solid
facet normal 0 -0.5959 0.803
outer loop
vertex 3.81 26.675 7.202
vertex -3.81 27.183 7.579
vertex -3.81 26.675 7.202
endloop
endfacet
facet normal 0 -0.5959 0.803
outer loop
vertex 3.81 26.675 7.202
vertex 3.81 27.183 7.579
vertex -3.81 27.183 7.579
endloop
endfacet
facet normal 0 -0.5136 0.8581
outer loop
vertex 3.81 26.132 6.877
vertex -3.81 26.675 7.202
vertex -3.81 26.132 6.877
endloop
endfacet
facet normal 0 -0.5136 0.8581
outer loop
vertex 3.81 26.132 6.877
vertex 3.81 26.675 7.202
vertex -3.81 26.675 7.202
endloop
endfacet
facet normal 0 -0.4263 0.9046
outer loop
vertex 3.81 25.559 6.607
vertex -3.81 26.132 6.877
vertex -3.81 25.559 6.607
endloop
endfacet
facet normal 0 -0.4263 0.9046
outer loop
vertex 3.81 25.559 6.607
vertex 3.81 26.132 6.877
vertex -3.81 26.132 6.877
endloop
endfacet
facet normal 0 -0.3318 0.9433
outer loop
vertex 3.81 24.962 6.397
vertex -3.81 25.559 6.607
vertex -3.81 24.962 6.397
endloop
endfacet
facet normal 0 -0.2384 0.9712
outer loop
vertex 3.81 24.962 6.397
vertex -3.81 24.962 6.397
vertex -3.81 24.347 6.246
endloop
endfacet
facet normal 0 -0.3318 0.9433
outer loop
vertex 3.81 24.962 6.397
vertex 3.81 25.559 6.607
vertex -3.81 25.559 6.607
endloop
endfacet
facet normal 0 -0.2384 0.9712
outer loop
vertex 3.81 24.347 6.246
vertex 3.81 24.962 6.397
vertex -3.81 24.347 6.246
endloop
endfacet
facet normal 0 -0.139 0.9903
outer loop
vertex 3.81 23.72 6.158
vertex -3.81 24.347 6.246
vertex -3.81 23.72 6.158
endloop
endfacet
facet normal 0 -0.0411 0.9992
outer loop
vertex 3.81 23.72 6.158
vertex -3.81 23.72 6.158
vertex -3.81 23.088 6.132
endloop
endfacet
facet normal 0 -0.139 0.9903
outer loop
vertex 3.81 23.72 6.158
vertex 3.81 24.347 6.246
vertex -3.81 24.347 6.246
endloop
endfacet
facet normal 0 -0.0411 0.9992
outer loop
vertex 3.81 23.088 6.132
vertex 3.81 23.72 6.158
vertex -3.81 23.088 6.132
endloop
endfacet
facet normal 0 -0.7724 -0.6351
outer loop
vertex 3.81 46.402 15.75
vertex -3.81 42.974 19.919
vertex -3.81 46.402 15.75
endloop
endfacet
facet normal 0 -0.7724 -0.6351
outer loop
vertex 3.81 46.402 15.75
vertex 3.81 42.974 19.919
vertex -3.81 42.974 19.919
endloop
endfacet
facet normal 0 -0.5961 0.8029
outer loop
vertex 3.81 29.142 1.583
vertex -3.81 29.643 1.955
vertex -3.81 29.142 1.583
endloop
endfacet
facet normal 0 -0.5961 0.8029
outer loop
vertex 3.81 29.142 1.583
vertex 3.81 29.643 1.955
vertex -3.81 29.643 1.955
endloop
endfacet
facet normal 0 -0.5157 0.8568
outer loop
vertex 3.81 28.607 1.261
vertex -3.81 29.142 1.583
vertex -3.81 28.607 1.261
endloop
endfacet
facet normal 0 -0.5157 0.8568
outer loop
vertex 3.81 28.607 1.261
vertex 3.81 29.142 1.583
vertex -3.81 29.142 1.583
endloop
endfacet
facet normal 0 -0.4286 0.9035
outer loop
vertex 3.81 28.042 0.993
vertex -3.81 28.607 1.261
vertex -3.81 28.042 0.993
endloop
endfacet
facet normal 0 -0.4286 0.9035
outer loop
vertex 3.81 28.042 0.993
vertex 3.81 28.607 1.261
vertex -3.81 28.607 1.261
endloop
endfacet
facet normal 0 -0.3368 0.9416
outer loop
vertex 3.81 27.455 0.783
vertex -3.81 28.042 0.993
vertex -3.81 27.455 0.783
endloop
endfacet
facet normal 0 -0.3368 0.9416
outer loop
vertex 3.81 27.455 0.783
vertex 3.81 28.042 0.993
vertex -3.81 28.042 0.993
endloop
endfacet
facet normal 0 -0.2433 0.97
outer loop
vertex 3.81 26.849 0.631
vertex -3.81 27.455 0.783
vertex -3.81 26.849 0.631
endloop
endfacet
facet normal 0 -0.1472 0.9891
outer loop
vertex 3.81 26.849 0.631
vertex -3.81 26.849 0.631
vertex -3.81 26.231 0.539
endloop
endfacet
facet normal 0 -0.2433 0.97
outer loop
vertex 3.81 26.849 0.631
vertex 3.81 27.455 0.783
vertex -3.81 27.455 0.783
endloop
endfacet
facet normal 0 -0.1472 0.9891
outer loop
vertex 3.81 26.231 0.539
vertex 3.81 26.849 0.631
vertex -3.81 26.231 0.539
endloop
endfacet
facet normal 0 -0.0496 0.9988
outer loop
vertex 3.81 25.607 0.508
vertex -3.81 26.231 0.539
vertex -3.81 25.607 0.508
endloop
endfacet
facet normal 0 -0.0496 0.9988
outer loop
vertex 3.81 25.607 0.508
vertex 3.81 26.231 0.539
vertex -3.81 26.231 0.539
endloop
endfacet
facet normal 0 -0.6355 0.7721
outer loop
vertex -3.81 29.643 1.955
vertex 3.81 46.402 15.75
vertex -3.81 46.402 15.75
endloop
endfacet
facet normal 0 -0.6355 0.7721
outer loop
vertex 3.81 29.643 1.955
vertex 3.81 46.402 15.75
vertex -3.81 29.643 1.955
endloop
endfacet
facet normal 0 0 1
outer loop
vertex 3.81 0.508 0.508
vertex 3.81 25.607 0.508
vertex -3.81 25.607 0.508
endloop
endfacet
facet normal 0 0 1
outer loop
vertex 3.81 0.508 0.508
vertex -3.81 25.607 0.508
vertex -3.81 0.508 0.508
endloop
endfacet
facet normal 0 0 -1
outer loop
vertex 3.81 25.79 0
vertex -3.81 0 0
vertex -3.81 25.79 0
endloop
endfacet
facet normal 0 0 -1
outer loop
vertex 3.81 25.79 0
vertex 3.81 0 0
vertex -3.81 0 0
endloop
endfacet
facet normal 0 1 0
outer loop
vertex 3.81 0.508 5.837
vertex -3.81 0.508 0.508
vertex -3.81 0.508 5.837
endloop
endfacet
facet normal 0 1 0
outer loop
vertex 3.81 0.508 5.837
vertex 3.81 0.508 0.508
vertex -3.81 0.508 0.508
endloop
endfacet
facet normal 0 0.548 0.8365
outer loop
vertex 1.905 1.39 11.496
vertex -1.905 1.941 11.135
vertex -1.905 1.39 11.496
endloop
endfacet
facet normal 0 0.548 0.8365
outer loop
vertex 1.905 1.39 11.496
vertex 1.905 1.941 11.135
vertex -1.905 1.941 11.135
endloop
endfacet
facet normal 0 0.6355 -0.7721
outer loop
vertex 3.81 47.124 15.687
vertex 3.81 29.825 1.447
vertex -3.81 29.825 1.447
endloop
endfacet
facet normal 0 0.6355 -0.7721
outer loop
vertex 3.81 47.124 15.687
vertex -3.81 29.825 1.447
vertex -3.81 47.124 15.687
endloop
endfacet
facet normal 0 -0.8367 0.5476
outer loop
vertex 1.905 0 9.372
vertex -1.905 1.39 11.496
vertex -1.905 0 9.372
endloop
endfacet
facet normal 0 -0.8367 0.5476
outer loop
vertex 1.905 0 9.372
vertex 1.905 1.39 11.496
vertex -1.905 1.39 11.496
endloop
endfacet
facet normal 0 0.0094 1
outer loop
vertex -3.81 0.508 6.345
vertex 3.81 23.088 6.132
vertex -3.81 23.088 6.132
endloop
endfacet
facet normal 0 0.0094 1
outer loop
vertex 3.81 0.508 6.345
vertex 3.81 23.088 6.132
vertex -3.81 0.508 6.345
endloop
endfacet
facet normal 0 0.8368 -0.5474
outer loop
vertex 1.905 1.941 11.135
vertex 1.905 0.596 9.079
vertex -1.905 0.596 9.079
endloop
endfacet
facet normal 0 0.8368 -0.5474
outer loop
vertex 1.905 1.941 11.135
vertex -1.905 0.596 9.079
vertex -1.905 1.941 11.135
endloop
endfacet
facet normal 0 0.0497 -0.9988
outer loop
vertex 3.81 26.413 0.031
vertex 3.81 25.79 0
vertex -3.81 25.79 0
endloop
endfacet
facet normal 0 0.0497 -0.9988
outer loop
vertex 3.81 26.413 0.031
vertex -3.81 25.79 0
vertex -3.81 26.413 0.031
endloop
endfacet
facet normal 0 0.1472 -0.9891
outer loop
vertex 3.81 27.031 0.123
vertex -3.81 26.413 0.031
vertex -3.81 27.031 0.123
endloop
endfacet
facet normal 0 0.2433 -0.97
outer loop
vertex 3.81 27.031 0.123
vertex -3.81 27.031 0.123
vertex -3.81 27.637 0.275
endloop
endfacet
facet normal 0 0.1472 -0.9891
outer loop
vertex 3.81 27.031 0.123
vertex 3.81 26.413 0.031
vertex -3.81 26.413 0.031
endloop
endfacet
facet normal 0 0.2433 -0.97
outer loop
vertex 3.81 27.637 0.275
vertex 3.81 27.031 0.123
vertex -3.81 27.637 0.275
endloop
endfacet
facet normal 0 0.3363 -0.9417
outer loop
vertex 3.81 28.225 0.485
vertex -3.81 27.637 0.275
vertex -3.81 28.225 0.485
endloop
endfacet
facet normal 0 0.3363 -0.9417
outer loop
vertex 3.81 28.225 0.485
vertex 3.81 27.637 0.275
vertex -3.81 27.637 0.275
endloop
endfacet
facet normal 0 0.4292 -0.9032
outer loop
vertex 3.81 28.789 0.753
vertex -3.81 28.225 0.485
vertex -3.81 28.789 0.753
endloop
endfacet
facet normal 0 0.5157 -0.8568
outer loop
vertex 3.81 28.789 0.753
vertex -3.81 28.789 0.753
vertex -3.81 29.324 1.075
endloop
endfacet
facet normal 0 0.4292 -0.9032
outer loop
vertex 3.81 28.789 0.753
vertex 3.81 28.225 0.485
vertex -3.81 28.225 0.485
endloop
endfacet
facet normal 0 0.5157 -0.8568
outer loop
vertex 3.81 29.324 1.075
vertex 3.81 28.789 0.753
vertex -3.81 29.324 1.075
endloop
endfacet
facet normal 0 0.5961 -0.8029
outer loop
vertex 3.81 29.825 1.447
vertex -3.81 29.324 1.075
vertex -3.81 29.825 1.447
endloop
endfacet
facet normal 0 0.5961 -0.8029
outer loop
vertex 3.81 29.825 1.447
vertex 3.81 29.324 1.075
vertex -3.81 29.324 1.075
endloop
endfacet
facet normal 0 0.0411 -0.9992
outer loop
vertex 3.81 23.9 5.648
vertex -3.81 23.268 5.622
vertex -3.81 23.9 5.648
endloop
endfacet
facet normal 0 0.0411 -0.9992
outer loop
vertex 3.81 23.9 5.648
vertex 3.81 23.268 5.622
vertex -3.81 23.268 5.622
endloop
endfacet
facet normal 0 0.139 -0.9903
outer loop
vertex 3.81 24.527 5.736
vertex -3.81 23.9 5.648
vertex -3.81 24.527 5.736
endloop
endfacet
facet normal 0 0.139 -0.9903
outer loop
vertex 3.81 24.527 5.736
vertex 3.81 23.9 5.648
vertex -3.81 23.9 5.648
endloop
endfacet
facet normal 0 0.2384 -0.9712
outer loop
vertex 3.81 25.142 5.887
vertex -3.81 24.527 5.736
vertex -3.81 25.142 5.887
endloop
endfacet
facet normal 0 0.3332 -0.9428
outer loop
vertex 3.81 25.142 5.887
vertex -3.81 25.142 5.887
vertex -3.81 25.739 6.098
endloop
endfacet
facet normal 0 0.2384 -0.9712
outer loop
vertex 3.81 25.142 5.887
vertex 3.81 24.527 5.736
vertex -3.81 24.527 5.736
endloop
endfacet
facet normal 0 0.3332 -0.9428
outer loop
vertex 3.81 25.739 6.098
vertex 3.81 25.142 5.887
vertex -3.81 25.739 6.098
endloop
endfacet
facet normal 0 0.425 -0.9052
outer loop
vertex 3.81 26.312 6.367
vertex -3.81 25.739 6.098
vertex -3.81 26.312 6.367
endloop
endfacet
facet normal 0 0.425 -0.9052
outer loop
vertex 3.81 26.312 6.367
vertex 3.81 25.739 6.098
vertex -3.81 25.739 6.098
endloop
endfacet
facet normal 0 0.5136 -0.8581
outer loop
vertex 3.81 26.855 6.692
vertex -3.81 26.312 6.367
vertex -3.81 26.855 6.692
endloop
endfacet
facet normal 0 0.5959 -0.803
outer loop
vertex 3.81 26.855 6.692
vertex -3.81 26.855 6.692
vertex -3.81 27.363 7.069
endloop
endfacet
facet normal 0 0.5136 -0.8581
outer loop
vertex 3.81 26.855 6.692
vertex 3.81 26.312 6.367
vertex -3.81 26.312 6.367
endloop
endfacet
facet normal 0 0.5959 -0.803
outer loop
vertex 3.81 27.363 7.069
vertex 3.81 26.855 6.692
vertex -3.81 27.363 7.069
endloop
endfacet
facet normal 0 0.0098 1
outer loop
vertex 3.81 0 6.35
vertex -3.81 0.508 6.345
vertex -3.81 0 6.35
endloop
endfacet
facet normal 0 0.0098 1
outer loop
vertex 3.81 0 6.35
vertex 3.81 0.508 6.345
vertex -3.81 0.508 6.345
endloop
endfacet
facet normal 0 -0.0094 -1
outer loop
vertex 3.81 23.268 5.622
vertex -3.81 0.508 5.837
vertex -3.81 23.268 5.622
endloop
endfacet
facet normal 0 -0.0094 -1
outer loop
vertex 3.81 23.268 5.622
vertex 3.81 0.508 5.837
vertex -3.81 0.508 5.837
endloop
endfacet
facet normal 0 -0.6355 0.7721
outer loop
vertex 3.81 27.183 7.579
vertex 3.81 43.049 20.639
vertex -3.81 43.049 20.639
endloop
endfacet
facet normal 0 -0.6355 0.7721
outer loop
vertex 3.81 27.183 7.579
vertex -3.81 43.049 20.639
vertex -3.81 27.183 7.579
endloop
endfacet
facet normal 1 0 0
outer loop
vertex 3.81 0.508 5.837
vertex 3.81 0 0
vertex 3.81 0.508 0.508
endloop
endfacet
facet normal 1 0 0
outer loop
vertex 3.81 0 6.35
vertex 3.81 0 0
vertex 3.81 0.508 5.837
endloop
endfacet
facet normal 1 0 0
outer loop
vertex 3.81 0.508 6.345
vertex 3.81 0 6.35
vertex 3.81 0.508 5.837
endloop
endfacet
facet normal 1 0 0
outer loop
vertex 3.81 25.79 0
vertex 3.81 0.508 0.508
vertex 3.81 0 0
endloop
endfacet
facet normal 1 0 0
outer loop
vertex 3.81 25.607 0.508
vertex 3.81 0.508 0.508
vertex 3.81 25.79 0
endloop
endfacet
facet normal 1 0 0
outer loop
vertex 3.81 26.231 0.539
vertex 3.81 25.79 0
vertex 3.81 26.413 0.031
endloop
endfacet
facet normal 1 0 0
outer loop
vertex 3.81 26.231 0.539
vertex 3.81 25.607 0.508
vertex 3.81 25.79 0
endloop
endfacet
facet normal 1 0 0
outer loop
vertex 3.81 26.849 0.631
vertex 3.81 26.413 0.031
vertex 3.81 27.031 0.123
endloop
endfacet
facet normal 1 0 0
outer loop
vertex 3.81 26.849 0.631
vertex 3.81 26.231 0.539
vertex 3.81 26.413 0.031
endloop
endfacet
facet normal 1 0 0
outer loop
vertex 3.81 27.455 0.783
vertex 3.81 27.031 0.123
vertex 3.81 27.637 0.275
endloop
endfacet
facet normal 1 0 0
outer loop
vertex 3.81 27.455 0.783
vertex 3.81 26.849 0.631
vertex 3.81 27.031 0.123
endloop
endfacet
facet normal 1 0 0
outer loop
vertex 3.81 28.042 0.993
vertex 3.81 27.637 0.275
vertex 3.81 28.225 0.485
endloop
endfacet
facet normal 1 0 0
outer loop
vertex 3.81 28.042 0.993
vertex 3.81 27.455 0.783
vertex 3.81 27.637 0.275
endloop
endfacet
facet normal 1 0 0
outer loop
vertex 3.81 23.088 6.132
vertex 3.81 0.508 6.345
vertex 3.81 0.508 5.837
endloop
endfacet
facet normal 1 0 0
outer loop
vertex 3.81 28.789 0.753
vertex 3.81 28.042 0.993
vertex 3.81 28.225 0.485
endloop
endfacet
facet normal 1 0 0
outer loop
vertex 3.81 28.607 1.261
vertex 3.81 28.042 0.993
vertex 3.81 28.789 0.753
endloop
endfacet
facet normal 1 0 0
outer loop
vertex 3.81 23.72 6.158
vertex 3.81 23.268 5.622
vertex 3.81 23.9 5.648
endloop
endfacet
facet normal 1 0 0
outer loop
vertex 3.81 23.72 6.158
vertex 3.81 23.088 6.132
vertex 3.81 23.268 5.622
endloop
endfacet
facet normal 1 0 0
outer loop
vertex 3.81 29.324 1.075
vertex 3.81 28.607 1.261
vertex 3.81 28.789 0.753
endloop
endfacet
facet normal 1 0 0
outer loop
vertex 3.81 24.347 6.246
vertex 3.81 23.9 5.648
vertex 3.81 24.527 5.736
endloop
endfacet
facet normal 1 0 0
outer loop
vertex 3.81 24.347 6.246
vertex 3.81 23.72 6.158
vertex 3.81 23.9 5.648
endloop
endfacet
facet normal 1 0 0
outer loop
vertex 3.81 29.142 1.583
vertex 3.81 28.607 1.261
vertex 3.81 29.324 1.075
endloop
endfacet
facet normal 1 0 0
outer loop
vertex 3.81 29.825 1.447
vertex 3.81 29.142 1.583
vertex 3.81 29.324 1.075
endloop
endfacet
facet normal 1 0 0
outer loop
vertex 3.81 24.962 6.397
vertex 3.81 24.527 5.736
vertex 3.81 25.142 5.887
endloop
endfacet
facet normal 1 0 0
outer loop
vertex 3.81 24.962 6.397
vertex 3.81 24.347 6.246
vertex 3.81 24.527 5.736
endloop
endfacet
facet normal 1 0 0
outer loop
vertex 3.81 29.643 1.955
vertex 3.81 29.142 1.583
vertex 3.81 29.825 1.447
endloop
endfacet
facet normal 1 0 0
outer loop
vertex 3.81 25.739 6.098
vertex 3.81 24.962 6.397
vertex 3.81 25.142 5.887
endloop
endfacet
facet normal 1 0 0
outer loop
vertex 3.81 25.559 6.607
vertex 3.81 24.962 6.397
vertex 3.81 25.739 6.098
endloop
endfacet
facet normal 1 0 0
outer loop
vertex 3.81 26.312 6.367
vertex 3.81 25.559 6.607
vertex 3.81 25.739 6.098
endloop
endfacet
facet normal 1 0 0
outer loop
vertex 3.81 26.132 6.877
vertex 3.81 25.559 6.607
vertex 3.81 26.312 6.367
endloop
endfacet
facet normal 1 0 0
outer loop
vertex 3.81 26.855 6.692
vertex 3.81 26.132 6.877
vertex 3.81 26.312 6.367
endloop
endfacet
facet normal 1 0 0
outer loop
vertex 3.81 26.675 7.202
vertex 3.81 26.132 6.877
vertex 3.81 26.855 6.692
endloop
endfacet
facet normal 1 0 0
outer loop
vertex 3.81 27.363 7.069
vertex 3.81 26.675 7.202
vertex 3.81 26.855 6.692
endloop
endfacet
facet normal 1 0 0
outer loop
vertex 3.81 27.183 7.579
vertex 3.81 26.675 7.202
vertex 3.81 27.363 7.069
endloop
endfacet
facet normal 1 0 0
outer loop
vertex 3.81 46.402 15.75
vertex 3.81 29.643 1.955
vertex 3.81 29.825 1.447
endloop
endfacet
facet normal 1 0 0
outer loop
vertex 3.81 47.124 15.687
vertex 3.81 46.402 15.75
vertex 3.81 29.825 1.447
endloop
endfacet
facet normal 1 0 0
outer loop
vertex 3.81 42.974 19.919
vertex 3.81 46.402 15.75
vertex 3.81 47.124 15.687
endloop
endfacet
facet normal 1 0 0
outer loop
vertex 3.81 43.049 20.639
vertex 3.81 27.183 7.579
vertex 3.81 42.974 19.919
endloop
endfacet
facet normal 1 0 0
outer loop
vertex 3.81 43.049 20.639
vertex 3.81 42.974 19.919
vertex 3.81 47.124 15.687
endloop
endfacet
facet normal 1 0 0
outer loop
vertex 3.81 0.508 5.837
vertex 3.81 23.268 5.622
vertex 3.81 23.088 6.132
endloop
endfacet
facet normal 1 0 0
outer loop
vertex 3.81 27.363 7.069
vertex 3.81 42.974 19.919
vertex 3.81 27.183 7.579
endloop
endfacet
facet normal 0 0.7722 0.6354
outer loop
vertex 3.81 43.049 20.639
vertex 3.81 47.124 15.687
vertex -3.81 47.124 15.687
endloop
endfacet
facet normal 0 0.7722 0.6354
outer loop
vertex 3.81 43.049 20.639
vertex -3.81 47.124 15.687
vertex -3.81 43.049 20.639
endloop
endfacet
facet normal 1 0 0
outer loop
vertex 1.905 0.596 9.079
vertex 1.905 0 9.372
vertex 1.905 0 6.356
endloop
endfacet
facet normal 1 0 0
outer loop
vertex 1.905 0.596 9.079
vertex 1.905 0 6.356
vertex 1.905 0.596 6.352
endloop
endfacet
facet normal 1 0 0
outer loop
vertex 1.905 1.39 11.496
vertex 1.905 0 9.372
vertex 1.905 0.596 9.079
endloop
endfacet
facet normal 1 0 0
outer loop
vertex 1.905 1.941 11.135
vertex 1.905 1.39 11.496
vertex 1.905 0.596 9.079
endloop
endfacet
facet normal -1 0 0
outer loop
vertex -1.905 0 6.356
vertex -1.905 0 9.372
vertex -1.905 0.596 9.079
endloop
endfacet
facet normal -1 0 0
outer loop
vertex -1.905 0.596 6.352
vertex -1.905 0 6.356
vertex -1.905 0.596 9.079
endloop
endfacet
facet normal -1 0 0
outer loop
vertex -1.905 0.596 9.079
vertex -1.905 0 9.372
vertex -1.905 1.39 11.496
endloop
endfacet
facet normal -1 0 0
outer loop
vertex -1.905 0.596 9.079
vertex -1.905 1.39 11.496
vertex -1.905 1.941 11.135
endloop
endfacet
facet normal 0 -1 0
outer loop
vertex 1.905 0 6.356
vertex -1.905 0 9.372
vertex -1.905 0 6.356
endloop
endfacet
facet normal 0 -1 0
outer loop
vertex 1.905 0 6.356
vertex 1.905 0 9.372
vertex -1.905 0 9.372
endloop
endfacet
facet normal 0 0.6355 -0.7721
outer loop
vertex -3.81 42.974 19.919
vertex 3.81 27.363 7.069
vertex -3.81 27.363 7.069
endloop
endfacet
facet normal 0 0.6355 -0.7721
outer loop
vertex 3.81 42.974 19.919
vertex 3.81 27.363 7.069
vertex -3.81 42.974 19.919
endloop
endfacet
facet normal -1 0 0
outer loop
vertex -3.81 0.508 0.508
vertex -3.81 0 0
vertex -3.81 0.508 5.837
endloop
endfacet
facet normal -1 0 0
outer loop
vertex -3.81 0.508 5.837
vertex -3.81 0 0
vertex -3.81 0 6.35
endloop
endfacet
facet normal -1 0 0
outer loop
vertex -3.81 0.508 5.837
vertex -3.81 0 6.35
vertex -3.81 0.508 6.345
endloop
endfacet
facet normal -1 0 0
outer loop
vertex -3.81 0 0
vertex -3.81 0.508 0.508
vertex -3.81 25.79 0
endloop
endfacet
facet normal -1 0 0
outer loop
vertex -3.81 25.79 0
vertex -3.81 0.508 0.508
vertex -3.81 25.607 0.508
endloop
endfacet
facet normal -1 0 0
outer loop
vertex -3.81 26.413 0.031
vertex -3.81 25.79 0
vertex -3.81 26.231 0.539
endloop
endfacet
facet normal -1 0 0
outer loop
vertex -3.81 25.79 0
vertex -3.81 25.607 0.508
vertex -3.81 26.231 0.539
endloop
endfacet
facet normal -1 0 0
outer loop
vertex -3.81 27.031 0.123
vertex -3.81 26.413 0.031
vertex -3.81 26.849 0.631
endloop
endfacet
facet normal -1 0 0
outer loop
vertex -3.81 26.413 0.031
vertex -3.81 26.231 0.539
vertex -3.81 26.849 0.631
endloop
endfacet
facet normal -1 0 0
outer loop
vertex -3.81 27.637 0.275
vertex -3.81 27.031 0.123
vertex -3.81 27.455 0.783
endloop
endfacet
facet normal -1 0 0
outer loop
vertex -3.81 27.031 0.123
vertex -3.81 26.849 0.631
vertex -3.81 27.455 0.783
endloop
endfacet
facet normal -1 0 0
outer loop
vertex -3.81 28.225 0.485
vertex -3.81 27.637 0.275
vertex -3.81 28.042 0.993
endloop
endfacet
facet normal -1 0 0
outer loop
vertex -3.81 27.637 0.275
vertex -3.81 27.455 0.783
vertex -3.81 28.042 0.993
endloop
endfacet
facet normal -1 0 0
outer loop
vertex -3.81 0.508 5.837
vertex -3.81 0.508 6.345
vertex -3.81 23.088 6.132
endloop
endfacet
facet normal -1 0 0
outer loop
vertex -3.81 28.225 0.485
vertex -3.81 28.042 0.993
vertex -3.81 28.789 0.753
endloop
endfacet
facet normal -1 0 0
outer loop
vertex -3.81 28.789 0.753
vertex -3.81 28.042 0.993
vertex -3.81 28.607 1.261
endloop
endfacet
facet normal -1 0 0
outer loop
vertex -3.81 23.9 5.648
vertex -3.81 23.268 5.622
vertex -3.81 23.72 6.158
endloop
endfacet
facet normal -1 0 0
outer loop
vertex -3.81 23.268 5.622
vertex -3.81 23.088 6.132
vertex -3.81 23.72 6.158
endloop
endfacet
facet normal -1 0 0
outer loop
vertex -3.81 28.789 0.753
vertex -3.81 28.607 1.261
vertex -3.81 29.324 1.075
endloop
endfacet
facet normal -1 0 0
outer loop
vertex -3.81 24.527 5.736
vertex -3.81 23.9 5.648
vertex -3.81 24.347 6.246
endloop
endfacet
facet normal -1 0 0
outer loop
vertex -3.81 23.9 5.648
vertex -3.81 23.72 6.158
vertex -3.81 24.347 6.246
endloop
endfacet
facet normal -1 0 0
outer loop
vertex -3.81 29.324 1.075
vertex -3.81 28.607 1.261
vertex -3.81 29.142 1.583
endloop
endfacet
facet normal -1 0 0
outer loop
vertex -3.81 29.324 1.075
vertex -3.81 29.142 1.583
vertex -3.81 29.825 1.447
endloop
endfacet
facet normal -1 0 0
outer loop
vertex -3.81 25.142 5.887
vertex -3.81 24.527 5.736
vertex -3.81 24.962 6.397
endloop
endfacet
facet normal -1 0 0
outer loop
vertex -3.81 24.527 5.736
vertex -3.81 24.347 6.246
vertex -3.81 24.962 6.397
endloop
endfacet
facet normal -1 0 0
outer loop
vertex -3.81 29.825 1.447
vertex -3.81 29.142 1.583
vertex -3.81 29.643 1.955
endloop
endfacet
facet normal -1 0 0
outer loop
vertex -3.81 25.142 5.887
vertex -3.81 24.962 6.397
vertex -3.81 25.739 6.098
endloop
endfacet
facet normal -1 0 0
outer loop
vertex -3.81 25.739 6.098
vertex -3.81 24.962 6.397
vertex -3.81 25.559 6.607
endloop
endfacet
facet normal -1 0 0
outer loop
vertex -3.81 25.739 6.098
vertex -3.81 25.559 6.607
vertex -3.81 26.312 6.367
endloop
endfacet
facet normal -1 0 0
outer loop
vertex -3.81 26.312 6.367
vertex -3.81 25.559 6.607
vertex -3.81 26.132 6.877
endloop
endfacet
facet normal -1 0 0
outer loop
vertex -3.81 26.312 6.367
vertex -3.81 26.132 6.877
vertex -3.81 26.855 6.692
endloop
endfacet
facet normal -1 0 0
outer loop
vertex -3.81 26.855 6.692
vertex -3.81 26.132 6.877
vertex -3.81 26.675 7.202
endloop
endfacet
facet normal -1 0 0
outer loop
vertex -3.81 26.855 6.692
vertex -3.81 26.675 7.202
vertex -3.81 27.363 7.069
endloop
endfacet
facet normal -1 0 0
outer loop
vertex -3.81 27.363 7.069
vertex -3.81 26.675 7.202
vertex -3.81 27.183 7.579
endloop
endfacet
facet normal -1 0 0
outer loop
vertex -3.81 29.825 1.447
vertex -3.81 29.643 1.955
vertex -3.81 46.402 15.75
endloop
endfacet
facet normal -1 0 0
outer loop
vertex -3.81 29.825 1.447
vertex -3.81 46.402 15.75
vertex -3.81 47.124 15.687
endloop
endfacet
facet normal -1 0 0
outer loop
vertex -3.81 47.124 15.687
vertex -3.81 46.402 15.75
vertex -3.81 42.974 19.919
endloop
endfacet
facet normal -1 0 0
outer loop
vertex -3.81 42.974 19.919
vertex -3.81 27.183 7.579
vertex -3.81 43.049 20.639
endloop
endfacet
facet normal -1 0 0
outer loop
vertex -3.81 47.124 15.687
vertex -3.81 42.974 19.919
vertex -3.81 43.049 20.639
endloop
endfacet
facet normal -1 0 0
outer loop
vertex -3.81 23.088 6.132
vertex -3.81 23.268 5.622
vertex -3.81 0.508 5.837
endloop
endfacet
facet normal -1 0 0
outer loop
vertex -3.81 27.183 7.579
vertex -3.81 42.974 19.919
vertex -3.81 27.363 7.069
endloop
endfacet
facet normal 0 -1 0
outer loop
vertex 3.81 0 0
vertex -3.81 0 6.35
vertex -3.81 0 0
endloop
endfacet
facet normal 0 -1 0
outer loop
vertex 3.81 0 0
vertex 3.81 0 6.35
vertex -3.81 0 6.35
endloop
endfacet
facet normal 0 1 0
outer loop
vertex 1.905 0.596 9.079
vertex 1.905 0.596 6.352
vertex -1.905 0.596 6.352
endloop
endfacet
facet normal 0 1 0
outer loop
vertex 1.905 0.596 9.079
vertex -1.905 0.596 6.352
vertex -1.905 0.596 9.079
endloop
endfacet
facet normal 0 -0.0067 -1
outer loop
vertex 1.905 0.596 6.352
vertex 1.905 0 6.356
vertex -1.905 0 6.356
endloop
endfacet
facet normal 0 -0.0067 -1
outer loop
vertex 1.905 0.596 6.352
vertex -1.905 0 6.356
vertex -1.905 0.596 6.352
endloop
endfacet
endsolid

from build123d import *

# Parameters (mm, degrees)
F1_DEPTH = 3.81
F3_DEPTH = 1.905


with BuildPart() as f1:
    # F0 (on Right) → F1 (new body, symmetric)
    with BuildSketch(Plane.YZ):
        with BuildLine():
            Line((0, 5.841977), (0, 0))
            Line((0, 0), (25.789659, 0))
            ThreePointArc((25.789659, 0), (27.93331, 0.372772), (29.825279, 1.447321))
            Line((29.825279, 1.447321), (47.124376, 15.687003))
            Line((47.124376, 15.687003), (43.048515, 20.638569))
            Line((43.048515, 20.638569), (27.183299, 7.57918))
            ThreePointArc((27.183299, 7.57918), (25.263106, 6.494584), (23.087761, 6.132142))
            Line((23.087761, 6.132142), (0.508, 6.345206))
            Line((0.508, 6.345206), (0, 6.35))
            Line((0, 6.35), (0, 5.841977))
        make_face()
        with BuildLine():
            Line((25.607471, 0.508), (0.508, 0.508))
            Line((0.508, 0.508), (0.508, 5.837184))
            Line((0.508, 5.837184), (23.267856, 5.62242))
            ThreePointArc((23.267856, 5.62242), (25.443201, 5.984862), (27.363394, 7.069458))
            Line((27.363394, 7.069458), (42.973744, 19.919055))
            Line((42.973744, 19.919055), (46.402173, 15.750491))
            Line((46.402173, 15.750491), (29.643092, 1.955321))
            ThreePointArc((29.643092, 1.955321), (27.751123, 0.880772), (25.607471, 0.508))
        make_face(mode=Mode.SUBTRACT)
    extrude(amount=F1_DEPTH, both=True)


with BuildPart() as f3:
    # F2 (on Right) → F3 (new body, symmetric)
    with BuildSketch(Plane.YZ):
        Polygon((0, 9.372201), (0, 6.356489), (0.595771, 6.352376), (0.595771, 9.078988), (1.941208, 11.135062), (1.389717, 11.495942), align=None)
    extrude(amount=F3_DEPTH, both=True)


solid = Compound([f1.part, f3.part])
